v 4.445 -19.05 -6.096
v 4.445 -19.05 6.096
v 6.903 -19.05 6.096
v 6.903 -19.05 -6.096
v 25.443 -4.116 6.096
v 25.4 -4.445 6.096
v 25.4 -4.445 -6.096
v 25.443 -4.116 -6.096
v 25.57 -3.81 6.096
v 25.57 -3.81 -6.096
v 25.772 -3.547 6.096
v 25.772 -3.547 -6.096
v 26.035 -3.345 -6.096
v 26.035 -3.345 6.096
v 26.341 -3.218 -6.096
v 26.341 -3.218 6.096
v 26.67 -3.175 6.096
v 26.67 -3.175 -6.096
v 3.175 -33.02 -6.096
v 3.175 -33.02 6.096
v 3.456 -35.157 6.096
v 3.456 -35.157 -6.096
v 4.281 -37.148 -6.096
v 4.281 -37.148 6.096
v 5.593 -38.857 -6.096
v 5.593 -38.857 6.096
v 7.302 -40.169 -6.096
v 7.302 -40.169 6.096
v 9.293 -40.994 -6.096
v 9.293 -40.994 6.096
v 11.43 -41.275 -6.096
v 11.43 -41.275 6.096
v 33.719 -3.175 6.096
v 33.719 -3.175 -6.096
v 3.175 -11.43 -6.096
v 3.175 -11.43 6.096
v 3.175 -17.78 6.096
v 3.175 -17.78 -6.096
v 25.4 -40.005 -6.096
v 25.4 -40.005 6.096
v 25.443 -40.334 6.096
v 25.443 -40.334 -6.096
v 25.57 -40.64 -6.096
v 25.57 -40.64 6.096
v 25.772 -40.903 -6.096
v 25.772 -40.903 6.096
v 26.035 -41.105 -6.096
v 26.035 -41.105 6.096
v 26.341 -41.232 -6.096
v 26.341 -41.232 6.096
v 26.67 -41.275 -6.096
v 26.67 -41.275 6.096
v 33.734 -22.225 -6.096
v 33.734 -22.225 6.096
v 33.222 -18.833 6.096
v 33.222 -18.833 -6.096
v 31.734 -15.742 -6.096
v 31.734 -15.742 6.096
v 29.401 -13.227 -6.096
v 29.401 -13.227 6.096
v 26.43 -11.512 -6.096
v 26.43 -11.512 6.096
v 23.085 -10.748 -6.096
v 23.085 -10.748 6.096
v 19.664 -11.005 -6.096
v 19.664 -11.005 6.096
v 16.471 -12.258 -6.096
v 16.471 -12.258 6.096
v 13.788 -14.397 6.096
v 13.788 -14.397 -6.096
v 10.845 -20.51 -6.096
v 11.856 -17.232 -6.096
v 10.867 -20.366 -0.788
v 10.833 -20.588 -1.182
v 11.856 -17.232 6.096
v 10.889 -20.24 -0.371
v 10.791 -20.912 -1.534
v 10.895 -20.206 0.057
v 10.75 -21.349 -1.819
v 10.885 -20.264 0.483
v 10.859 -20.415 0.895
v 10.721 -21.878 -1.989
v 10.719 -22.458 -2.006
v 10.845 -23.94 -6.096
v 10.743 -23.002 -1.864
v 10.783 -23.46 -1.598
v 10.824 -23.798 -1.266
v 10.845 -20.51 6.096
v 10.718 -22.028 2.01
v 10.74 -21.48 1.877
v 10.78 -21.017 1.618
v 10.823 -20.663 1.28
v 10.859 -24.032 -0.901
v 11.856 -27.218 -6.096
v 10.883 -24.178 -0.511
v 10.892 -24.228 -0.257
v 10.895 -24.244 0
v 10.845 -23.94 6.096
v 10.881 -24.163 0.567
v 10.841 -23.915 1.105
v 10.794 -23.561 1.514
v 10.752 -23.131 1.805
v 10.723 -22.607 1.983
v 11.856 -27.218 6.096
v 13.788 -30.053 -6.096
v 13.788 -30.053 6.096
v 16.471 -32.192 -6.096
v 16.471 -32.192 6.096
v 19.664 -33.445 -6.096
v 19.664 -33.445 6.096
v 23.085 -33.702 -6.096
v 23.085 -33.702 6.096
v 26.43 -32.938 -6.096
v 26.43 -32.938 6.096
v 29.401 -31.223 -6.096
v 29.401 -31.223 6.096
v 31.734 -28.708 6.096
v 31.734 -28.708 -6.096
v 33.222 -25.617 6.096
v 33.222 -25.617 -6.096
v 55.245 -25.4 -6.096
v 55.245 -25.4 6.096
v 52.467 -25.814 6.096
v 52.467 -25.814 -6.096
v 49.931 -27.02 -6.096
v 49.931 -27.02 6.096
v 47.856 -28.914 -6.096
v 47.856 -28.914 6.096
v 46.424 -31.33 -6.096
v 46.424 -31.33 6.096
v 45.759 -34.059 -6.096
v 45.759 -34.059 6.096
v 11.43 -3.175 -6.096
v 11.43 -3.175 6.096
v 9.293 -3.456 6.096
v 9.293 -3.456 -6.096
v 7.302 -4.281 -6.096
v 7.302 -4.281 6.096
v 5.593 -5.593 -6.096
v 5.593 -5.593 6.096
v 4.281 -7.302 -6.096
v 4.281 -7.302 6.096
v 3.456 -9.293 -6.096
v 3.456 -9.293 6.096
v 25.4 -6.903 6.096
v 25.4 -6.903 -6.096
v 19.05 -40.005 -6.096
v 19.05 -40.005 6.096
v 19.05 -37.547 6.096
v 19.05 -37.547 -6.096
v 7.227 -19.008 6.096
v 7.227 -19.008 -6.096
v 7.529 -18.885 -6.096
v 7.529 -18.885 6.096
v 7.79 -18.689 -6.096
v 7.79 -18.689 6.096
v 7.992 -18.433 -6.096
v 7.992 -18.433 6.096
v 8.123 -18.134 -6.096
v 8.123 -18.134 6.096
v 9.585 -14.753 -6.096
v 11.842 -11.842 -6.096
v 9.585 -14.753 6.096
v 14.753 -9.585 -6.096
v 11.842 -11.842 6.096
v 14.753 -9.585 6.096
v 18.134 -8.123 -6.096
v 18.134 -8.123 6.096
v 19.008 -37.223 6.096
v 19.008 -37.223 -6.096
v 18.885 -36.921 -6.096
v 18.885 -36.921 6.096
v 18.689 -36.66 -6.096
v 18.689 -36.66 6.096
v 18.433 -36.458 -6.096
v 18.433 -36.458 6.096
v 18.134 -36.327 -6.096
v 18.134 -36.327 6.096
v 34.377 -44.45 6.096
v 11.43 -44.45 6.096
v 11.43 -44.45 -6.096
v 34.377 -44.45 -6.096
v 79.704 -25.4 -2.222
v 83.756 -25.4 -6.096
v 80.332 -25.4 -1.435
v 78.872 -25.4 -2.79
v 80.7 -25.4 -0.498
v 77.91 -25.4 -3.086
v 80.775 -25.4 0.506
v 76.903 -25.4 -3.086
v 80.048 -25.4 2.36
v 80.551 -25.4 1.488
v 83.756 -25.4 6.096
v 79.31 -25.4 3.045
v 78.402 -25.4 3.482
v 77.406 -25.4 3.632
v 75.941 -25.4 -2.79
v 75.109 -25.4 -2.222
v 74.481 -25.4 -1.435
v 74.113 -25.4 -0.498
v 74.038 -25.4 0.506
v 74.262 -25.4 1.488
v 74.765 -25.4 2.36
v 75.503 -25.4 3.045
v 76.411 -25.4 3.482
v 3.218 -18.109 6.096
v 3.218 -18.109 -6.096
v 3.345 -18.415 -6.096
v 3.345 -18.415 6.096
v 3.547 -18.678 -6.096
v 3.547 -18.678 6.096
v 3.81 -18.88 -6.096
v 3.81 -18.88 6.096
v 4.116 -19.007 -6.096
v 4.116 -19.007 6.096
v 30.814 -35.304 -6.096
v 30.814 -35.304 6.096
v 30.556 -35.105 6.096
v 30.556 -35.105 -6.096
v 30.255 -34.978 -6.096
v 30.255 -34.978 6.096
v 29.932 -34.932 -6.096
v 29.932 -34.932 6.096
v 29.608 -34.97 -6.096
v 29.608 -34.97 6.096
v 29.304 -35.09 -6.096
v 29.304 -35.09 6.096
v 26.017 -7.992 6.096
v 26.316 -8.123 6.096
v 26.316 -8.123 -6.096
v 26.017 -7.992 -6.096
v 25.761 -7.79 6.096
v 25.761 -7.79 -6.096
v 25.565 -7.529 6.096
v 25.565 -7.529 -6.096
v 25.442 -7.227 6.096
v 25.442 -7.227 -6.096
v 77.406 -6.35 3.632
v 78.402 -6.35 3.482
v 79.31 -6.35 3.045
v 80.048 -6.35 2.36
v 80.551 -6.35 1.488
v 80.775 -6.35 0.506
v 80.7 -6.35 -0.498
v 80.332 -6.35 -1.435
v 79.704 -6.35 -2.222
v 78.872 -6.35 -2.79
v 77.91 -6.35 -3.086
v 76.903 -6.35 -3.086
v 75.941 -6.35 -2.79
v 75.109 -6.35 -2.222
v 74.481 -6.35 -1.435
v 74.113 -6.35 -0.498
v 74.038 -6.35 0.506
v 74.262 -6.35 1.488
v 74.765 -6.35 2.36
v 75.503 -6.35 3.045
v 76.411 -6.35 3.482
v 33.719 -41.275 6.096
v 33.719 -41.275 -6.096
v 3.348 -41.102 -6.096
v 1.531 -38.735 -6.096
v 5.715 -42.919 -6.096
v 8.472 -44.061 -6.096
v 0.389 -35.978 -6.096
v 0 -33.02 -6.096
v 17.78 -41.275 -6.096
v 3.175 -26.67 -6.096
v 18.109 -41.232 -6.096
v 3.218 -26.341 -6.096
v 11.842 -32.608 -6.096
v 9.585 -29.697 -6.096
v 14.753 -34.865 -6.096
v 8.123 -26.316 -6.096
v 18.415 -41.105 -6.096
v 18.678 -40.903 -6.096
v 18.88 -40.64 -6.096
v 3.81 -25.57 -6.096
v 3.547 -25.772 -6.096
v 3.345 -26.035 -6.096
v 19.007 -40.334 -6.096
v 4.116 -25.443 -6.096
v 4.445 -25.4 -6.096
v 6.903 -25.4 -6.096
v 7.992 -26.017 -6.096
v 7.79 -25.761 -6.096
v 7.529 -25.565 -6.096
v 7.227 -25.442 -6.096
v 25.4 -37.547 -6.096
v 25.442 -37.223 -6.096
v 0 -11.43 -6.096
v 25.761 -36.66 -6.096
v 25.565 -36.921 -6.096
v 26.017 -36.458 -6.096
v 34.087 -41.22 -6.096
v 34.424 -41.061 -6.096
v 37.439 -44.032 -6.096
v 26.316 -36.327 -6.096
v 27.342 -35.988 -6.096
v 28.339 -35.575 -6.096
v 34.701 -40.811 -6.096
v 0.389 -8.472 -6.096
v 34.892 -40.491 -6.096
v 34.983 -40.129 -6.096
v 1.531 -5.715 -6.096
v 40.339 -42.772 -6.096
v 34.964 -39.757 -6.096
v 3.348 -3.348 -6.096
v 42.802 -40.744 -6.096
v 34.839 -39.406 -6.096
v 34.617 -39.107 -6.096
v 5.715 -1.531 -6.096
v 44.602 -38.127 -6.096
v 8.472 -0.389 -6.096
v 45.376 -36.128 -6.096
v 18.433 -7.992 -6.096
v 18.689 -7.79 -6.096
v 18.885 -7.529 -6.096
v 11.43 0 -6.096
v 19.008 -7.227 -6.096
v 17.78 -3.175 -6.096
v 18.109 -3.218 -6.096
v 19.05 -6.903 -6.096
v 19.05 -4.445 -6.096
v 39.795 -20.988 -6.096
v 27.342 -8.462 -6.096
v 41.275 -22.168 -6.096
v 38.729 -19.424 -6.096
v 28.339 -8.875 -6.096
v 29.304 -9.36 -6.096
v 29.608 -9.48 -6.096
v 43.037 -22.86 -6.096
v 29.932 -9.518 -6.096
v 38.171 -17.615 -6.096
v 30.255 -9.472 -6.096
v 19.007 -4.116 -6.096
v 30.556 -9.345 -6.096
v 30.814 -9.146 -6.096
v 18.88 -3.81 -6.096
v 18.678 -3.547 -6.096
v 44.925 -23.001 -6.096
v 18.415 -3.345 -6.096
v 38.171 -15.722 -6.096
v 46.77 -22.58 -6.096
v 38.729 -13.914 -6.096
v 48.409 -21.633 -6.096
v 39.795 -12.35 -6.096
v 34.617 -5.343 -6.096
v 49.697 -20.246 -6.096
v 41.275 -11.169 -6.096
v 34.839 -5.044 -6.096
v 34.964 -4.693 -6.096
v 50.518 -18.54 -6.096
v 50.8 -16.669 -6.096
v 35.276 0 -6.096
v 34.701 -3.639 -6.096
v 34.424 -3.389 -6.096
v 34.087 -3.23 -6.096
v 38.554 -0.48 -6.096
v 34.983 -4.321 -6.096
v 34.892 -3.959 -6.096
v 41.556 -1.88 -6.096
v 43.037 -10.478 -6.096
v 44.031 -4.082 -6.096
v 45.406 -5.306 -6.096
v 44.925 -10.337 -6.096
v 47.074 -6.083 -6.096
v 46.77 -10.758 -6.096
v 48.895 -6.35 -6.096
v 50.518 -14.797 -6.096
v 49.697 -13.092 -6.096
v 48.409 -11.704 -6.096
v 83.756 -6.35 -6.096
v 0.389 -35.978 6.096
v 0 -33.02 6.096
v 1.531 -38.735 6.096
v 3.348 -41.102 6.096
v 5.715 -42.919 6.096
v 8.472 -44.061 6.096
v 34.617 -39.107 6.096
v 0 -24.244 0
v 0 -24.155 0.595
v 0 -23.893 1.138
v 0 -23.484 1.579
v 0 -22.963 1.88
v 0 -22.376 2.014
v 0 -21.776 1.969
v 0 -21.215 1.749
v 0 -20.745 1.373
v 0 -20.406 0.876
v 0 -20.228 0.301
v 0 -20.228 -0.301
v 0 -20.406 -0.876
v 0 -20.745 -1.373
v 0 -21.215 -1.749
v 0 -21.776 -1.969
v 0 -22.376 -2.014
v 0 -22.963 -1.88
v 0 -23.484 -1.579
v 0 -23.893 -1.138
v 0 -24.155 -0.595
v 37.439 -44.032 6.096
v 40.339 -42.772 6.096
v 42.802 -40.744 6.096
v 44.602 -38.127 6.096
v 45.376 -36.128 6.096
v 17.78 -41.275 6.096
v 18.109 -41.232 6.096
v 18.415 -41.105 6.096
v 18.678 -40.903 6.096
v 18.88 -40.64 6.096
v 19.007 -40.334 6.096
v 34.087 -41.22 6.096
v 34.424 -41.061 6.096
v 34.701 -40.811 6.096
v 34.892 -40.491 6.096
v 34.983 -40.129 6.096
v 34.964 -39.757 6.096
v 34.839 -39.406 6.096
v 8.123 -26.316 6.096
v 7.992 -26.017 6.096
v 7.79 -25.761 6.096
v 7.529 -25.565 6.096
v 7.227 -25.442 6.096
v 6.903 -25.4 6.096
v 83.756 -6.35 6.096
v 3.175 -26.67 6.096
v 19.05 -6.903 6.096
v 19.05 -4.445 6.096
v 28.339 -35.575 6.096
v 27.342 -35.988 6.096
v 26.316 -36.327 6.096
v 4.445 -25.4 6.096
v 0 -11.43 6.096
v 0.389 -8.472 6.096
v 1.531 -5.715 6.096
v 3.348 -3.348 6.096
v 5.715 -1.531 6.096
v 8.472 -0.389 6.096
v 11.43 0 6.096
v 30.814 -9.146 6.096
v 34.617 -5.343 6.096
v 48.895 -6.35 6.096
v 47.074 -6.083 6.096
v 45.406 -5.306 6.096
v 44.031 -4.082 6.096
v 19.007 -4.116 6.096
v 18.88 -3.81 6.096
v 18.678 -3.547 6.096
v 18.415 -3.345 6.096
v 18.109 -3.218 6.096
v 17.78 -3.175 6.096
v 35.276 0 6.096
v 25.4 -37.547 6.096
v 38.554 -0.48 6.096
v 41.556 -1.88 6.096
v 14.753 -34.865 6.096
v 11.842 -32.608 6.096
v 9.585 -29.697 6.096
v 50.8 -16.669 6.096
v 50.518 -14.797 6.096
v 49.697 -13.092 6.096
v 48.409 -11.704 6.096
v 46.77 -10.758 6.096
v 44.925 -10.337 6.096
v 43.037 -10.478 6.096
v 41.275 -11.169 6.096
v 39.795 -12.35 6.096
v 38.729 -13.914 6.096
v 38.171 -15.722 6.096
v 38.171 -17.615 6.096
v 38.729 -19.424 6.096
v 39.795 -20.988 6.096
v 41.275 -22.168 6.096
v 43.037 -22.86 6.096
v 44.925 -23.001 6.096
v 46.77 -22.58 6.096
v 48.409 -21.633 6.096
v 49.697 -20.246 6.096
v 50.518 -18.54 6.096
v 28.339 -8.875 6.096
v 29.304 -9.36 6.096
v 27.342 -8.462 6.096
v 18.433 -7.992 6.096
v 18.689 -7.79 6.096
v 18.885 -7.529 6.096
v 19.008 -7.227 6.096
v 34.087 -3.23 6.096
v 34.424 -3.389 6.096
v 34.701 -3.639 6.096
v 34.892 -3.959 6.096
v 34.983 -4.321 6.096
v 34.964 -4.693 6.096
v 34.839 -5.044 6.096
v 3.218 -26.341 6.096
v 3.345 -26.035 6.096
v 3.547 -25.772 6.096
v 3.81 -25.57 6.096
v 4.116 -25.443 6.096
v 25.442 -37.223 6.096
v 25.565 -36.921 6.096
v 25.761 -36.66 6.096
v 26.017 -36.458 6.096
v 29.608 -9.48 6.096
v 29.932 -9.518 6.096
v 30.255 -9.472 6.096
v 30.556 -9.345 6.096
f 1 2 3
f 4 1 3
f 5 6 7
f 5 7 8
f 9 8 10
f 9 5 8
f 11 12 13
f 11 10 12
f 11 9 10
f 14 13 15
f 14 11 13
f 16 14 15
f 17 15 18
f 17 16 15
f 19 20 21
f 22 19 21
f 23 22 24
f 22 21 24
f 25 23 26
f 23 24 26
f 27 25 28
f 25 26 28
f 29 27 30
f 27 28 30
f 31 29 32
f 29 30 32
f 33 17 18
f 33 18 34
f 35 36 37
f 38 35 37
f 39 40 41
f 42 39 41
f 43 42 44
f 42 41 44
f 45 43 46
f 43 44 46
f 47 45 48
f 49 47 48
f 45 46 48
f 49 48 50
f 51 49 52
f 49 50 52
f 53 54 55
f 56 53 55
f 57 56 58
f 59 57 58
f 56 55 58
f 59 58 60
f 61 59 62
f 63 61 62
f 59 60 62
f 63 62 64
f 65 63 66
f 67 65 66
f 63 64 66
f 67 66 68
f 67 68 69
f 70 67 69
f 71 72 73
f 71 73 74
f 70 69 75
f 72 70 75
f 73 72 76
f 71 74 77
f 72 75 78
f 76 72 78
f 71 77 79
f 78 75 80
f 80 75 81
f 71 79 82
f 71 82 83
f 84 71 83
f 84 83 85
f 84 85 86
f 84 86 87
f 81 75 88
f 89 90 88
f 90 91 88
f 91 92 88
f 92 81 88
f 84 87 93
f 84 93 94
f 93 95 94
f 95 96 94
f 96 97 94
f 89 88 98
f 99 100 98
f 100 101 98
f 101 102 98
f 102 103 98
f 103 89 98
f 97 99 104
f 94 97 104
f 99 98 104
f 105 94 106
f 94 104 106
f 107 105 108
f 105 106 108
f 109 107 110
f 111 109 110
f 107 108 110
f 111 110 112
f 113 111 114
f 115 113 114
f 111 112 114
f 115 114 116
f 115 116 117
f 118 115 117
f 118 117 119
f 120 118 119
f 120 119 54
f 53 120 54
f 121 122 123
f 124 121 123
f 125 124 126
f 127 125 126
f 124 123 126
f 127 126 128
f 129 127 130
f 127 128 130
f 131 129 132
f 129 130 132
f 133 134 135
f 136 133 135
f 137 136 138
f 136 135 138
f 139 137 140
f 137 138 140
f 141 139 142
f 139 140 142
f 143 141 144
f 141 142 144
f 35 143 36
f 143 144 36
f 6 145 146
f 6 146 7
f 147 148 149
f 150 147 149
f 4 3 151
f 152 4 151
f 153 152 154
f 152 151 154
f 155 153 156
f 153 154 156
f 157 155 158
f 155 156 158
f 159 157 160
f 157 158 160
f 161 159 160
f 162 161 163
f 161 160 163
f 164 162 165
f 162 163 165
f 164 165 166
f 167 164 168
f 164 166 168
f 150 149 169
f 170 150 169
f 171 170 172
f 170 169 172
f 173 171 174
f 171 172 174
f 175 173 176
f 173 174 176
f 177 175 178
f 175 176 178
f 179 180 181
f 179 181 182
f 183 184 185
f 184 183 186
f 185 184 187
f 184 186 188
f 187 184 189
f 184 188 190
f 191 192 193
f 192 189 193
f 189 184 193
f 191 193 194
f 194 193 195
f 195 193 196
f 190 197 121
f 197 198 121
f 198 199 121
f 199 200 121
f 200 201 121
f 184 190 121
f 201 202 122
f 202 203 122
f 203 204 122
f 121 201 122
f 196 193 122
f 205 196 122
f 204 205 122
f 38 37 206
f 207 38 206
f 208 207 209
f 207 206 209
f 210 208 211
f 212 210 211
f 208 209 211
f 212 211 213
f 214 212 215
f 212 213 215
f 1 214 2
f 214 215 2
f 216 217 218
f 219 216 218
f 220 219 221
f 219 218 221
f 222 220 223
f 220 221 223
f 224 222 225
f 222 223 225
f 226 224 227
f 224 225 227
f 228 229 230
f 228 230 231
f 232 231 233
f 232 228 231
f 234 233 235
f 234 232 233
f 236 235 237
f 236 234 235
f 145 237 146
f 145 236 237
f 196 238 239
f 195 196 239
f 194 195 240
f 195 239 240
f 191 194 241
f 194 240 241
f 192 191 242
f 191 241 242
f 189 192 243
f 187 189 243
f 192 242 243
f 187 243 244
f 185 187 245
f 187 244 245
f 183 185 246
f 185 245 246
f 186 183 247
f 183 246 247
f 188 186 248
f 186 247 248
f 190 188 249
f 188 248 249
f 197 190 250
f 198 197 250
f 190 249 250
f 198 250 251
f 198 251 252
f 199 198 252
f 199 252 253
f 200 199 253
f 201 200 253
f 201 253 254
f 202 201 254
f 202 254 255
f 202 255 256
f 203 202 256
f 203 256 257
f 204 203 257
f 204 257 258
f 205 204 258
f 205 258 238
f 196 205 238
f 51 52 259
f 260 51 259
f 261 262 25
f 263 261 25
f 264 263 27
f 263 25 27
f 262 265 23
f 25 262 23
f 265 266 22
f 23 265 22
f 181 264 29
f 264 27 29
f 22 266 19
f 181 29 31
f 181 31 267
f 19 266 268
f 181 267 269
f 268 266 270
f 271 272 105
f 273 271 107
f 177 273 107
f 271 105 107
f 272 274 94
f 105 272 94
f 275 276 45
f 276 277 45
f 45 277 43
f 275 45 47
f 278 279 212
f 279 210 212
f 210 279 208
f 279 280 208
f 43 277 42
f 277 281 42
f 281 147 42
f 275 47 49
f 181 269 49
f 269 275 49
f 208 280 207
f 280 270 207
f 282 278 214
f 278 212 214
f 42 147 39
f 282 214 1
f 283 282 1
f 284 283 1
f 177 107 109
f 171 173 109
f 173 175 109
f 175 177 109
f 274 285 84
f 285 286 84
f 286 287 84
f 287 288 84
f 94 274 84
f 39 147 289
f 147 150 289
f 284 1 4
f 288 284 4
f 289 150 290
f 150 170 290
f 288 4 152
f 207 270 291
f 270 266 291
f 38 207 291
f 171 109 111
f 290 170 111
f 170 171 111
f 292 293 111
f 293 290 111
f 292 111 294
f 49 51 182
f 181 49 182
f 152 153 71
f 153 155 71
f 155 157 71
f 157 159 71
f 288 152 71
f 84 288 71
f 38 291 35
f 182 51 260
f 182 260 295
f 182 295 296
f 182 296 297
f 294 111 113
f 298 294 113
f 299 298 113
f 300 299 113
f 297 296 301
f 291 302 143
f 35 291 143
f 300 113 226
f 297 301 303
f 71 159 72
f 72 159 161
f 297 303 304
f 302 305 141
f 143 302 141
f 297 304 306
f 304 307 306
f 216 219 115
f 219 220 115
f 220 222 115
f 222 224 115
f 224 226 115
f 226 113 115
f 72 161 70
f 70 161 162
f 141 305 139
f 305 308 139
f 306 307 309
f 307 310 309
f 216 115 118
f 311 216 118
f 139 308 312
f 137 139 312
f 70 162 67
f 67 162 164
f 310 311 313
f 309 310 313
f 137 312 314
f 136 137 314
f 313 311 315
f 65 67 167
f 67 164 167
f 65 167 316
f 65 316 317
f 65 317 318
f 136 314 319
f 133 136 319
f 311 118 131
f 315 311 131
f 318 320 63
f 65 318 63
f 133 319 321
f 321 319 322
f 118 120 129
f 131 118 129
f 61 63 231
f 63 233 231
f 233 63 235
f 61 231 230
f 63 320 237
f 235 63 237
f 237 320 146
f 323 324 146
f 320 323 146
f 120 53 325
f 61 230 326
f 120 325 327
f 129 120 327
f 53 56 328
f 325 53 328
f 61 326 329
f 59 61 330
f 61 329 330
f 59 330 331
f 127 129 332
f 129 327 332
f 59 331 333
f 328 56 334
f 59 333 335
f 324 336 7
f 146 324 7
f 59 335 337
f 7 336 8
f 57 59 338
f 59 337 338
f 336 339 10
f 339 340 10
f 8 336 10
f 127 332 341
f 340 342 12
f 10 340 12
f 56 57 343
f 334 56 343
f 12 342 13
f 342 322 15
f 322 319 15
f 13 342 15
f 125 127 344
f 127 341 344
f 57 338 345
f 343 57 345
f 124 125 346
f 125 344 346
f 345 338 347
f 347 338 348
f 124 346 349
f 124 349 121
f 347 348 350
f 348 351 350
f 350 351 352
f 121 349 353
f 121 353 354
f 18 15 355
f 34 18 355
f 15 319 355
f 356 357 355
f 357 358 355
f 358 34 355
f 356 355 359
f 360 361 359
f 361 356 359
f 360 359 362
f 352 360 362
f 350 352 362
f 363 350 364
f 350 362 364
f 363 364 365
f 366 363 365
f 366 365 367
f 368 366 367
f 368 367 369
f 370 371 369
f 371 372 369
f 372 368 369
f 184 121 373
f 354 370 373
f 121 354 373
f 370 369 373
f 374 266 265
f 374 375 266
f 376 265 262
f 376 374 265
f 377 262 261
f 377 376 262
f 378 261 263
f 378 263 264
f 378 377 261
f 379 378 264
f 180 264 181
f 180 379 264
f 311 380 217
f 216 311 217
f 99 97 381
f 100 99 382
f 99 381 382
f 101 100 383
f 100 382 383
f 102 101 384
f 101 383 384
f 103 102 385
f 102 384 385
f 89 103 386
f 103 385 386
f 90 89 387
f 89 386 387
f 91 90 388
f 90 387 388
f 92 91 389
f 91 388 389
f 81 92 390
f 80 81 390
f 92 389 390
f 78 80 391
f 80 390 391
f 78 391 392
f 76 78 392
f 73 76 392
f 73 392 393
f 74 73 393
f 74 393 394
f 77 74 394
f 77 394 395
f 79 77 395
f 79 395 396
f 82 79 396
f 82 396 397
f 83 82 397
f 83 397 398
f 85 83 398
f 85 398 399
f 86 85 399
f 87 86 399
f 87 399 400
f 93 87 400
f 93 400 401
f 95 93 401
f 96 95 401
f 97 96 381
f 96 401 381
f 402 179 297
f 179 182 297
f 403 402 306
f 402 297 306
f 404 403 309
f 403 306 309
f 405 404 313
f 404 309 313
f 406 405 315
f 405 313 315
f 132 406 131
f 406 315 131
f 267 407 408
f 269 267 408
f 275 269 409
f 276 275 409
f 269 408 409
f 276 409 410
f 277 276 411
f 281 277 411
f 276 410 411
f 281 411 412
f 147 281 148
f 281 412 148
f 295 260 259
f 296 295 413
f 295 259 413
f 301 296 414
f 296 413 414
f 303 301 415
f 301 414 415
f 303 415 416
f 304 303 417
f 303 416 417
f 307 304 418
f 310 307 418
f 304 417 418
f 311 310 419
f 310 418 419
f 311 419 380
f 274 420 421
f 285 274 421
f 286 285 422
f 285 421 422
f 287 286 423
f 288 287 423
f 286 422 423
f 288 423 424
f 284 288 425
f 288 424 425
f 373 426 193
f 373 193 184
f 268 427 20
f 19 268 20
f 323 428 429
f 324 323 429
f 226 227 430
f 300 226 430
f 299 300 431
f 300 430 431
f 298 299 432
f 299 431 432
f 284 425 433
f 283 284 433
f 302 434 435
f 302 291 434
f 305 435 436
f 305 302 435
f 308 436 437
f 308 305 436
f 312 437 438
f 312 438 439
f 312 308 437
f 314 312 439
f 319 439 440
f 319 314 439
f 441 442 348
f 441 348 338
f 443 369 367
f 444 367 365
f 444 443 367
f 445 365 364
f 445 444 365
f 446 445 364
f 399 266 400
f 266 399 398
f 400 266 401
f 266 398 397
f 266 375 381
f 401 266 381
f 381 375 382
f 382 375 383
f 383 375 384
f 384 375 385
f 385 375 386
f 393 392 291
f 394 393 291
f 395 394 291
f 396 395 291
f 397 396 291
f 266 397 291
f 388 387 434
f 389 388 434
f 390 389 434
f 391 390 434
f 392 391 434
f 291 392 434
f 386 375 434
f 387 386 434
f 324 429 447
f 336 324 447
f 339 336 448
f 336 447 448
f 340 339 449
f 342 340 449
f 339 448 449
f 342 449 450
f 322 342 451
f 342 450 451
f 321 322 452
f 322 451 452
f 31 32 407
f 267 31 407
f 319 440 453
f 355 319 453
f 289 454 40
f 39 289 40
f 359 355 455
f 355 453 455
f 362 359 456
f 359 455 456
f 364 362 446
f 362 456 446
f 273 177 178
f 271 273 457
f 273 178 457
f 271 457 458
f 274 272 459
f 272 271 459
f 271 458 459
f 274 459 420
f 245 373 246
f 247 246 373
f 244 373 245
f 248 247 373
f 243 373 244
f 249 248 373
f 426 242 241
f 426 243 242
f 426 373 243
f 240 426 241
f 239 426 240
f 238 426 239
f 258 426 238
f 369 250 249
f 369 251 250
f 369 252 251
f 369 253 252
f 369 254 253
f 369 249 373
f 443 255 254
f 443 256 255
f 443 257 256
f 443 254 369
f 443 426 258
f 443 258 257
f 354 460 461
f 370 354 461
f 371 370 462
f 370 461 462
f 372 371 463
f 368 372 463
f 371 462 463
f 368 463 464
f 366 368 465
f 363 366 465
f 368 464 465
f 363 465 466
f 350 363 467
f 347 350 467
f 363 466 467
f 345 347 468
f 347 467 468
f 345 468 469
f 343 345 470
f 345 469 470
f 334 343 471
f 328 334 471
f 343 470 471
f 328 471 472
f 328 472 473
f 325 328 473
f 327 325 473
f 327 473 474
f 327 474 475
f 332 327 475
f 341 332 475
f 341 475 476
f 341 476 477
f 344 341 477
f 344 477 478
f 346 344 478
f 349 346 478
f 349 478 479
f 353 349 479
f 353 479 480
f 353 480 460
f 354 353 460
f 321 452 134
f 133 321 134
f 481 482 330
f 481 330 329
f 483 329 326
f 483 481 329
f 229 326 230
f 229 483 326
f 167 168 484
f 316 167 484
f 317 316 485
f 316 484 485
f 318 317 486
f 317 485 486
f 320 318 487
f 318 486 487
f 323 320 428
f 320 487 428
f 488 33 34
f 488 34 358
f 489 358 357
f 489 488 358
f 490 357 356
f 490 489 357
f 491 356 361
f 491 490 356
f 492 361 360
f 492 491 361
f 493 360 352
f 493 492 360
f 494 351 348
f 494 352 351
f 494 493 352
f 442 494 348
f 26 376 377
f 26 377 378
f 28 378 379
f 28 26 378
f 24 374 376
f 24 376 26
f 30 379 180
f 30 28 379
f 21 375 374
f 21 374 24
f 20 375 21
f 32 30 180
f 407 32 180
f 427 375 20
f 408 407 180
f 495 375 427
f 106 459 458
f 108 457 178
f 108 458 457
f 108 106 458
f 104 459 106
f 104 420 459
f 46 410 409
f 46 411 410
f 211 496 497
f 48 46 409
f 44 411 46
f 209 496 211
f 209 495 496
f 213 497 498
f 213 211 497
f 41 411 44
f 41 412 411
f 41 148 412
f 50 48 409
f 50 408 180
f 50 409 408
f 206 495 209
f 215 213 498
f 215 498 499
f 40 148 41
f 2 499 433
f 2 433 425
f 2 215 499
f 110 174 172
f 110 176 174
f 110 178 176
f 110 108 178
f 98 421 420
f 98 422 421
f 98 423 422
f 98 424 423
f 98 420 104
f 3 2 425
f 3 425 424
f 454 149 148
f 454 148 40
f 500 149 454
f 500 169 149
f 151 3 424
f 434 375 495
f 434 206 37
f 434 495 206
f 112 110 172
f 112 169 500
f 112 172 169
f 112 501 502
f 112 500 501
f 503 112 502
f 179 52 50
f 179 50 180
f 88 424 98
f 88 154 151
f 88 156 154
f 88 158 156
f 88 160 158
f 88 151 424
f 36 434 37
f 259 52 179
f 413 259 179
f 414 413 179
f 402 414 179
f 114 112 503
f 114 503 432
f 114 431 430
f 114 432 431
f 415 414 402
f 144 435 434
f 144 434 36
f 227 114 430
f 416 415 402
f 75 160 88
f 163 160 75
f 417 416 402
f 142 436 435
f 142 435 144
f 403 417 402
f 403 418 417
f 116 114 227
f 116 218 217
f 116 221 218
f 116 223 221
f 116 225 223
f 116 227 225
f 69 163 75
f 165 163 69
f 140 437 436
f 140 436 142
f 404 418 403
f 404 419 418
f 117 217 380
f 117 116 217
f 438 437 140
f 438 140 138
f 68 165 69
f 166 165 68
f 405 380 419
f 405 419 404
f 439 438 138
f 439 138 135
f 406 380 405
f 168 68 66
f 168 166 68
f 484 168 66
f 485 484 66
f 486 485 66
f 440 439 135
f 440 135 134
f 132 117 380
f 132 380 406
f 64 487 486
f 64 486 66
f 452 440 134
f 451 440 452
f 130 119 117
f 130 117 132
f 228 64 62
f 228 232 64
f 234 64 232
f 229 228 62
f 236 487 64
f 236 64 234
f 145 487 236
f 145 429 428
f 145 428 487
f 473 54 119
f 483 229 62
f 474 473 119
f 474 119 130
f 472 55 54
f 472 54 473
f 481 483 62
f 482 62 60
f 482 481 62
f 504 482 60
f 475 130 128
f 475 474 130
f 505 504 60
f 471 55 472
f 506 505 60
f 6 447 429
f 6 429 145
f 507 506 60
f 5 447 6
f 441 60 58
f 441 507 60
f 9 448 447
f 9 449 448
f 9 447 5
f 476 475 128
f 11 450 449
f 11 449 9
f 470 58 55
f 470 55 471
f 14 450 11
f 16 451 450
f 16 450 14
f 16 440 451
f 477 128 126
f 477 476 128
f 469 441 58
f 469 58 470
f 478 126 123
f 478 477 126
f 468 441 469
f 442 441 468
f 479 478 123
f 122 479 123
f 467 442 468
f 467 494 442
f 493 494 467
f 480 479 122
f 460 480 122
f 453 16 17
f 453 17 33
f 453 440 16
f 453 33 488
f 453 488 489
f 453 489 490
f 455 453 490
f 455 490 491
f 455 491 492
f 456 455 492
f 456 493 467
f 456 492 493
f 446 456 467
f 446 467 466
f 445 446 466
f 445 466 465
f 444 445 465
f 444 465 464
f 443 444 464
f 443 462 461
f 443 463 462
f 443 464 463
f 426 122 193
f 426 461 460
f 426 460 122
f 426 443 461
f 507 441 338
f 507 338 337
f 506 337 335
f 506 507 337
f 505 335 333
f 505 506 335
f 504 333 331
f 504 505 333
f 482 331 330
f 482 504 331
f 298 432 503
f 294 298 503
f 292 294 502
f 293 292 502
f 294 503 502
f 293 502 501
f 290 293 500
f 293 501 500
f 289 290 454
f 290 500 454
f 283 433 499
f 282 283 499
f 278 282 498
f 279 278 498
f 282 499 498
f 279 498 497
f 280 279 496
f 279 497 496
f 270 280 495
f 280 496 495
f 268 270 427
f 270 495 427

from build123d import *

# Parameters (mm, degrees)
SKETCH1_W               = 96.52
SKETCH1_H               = 44.45
BOSS_EXTRUDE1_DEPTH     = 6.096
CUT_EXTRUDE1_REACH      = 108.961
SKETCH2_R               = 11.50874
CUT_EXTRUDE2_REACH      = 108.438
SKETCH3_R               = 3.3782
CUT_EXTRUDE3_REACH      = 108.961
SKETCH7_W               = 12.7635
SKETCH7_H               = 12.192
CUT_EXTRUDE5_DEPTH      = 104.946532487
FILLET1_R               = 11.43
CUT_EXTRUDE9_REACH      = 97.016
CUT_EXTRUDE9_END_RADIUS = 11.50874
SKETCH11_R              = 2.0193
SKETCH12_R              = 6.35
CUT_EXTRUDE10_DEPTH     = 96.601248341


with BuildPart() as part:
    # Sketch1 → Boss-Extrude1 (new, symmetric)
    with BuildSketch(Plane.XY):
        with Locations((48.26, -22.225)):
            Rectangle(SKETCH1_W, SKETCH1_H)
    extrude(amount=BOSS_EXTRUDE1_DEPTH, both=True)

    # Sketch2 → Cut-Extrude1 (cut, up to next)
    with BuildSketch(Plane.XY.offset(6.096), mode=Mode.PRIVATE) as cut_extrude1_sk1:
        with Locations((22.225, -22.225)):
            Circle(SKETCH2_R)
    cut_extrude1_tool1 = extrude(cut_extrude1_sk1.sketch, amount=-CUT_EXTRUDE1_REACH, mode=Mode.PRIVATE) & part.part
    add(cut_extrude1_tool1.solids().sort_by_distance((22.225, -22.225, 6.096))[0], mode=Mode.SUBTRACT)

    # Sketch3 → Cut-Extrude2 (cut, up to next)
    with BuildSketch(Plane(origin=(0, 0, 0), x_dir=(1, 0, 0), z_dir=(0, 1, 0)), mode=Mode.PRIVATE) as cut_extrude2_sk1:
        with Locations(Location((77.4065, -0.254, 0), (0, 0, 270))):
            Circle(SKETCH3_R)
    cut_extrude2_tool1 = extrude(cut_extrude2_sk1.sketch, amount=-CUT_EXTRUDE2_REACH, mode=Mode.PRIVATE) & part.part
    add(cut_extrude2_tool1.solids().sort_by_distance((77.4065, 0, 0.254))[0], mode=Mode.SUBTRACT)

    # Sketch4 → Cut-Extrude3 (cut, up to next)
    with BuildSketch(Plane.XY.offset(6.096), mode=Mode.PRIVATE) as cut_extrude3_sk1:
        with BuildLine():
            Line((48.895, 6.35), (96.52, 6.35))
            ThreePointArc((96.52, 6.35), (102.87, 0), (96.52, -6.35))
            Line((96.52, -6.35), (48.895, -6.35))
            ThreePointArc((48.895, -6.35), (42.545, 0), (48.895, 6.35))
        make_face()
    cut_extrude3_tool1 = extrude(cut_extrude3_sk1.sketch, amount=-CUT_EXTRUDE3_REACH, mode=Mode.PRIVATE) & part.part
    # Sketch4 → Cut-Extrude3 (cut, up to next)
    with BuildSketch(Plane.XY.offset(6.096), mode=Mode.PRIVATE) as cut_extrude3_sk2:
        with BuildLine():
            Line((45.72, -34.925), (45.72, -44.45))
            Line((45.72, -44.45), (55.245, -44.45))
            Line((55.245, -44.45), (96.52, -44.45))
            ThreePointArc((96.52, -44.45), (106.045, -34.925), (96.52, -25.4))
            Line((96.52, -25.4), (55.245, -25.4))
            ThreePointArc((55.245, -25.4), (48.509807909, -28.189807909), (45.72, -34.925))
        make_face()
    cut_extrude3_tool2 = extrude(cut_extrude3_sk2.sketch, amount=-CUT_EXTRUDE3_REACH, mode=Mode.PRIVATE) & part.part
    add(cut_extrude3_tool1.solids().sort_by_distance((72.7075, 0, 6.096))[0], mode=Mode.SUBTRACT)
    add(cut_extrude3_tool2.solids().sort_by_distance((75.382091, -35.05704, 6.096))[0], mode=Mode.SUBTRACT)

    # Sketch7 → Cut-Extrude5 (cut, through all)
    with BuildSketch(Plane(origin=(0, -6.35, 0), x_dir=(1, 0, 0), z_dir=(0, 1, 0))):
        with Locations((90.13825, 0)):
            Rectangle(SKETCH7_W, SKETCH7_H)
    extrude(amount=-CUT_EXTRUDE5_DEPTH, mode=Mode.SUBTRACT)

    # Fillet1
    fillet1_edges = [part.edges().sort_by_distance(p)[0] for p in [
        (42.545, 0, 0),
        (45.72, -44.45, 0),
        (0, -44.45, 0),
        (0, 0, 0),
    ]]
    fillet(fillet1_edges, radius=FILLET1_R)

    # Cut-Extrude9: up to this cylinder (the profile starts outside it)
    cut_extrude9_end = Plane(origin=(22.225, -22.225, 0), z_dir=(0, 0, 1)) * Cylinder(CUT_EXTRUDE9_END_RADIUS, 218.04948, mode=Mode.PRIVATE)
    # Sketch11 → Cut-Extrude9 (cut, up to the surface)
    with BuildSketch(Plane.ZY, mode=Mode.PRIVATE) as cut_extrude9_sk1:
        with Locations(Location((0, -22.225, 0), (0, 0, 270))):
            Circle(SKETCH11_R)
    cut_extrude9_tool1 = extrude(cut_extrude9_sk1.sketch, amount=-CUT_EXTRUDE9_REACH, mode=Mode.PRIVATE) - cut_extrude9_end
    add(cut_extrude9_tool1.solids().sort_by_distance((0, -22.225, 0))[0], mode=Mode.SUBTRACT)

    # Sketch12 → Cut-Extrude10 (cut, through all)
    with BuildSketch(Plane.XY.offset(6.096)):
        with Locations((44.45, -16.66875)):
            Circle(SKETCH12_R)
        with BuildLine():
            Line((17.78, -3.175), (11.43, -3.175))
            ThreePointArc((11.43, -3.175), (5.592833521, -5.592833521), (3.175, -11.43))
            Line((3.175, -11.43), (3.175, -17.78))
            ThreePointArc((3.175, -17.78), (3.546974388, -18.678025612), (4.445, -19.05))
            Line((4.445, -19.05), (6.902996378, -19.05))
            ThreePointArc((6.902996378, -19.05), (7.665727307, -18.795451392), (8.122706904, -18.133844929))
            ThreePointArc((8.122706904, -18.133844929), (11.842027873, -11.842027873), (18.133844929, -8.122706904))
            ThreePointArc((18.133844929, -8.122706904), (18.795451392, -7.665727307), (19.05, -6.902996378))
            Line((19.05, -6.902996378), (19.05, -4.445))
            ThreePointArc((19.05, -4.445), (18.678025612, -3.546974388), (17.78, -3.175))
        make_face()
        with BuildLine():
            Line((26.67, -41.275), (33.718820715, -41.275))
            ThreePointArc((33.718820715, -41.275), (34.892147722, -40.491007959), (34.616846327, -39.106974388))
            Line((34.616846327, -39.106974388), (30.814228632, -35.304356693))
            ThreePointArc((30.814228632, -35.304356693), (30.094903373, -34.945017527), (29.303943585, -35.089710572))
            ThreePointArc((29.303943585, -35.089710572), (27.844224023, -35.791006847), (26.316155071, -36.327293096))
            ThreePointArc((26.316155071, -36.327293096), (25.654548608, -36.784272693), (25.4, -37.547003622))
            Line((25.4, -37.547003622), (25.4, -40.005))
            ThreePointArc((25.4, -40.005), (25.771974388, -40.903025612), (26.67, -41.275))
        make_face()
        with BuildLine():
            Line((34.616846327, -5.343025612), (30.814228632, -9.145643307))
            ThreePointArc((30.814228632, -9.145643307), (30.094903373, -9.504982473), (29.303943585, -9.360289428))
            ThreePointArc((29.303943585, -9.360289428), (27.844224023, -8.658993153), (26.316155071, -8.122706904))
            ThreePointArc((26.316155071, -8.122706904), (25.654548608, -7.665727307), (25.4, -6.902996378))
            Line((25.4, -6.902996378), (25.4, -4.445))
            ThreePointArc((25.4, -4.445), (25.771974388, -3.546974388), (26.67, -3.175))
            Line((26.67, -3.175), (33.718820715, -3.175))
            ThreePointArc((33.718820715, -3.175), (34.892147722, -3.958992041), (34.616846327, -5.343025612))
        make_face()
        with BuildLine():
            Line((11.43, -41.275), (17.78, -41.275))
            ThreePointArc((17.78, -41.275), (18.678025612, -40.903025612), (19.05, -40.005))
            Line((19.05, -40.005), (19.05, -37.547003622))
            ThreePointArc((19.05, -37.547003622), (18.795451392, -36.784272693), (18.133844929, -36.327293096))
            ThreePointArc((18.133844929, -36.327293096), (11.842027873, -32.607972127), (8.122706904, -26.316155071))
            ThreePointArc((8.122706904, -26.316155071), (7.665727307, -25.654548608), (6.902996378, -25.4))
            Line((6.902996378, -25.4), (4.445, -25.4))
            ThreePointArc((4.445, -25.4), (3.546974388, -25.771974388), (3.175, -26.67))
            Line((3.175, -26.67), (3.175, -33.02))
            ThreePointArc((3.175, -33.02), (5.592833521, -38.857166479), (11.43, -41.275))
        make_face()
    extrude(amount=-CUT_EXTRUDE10_DEPTH, mode=Mode.SUBTRACT)


solid = part.part
